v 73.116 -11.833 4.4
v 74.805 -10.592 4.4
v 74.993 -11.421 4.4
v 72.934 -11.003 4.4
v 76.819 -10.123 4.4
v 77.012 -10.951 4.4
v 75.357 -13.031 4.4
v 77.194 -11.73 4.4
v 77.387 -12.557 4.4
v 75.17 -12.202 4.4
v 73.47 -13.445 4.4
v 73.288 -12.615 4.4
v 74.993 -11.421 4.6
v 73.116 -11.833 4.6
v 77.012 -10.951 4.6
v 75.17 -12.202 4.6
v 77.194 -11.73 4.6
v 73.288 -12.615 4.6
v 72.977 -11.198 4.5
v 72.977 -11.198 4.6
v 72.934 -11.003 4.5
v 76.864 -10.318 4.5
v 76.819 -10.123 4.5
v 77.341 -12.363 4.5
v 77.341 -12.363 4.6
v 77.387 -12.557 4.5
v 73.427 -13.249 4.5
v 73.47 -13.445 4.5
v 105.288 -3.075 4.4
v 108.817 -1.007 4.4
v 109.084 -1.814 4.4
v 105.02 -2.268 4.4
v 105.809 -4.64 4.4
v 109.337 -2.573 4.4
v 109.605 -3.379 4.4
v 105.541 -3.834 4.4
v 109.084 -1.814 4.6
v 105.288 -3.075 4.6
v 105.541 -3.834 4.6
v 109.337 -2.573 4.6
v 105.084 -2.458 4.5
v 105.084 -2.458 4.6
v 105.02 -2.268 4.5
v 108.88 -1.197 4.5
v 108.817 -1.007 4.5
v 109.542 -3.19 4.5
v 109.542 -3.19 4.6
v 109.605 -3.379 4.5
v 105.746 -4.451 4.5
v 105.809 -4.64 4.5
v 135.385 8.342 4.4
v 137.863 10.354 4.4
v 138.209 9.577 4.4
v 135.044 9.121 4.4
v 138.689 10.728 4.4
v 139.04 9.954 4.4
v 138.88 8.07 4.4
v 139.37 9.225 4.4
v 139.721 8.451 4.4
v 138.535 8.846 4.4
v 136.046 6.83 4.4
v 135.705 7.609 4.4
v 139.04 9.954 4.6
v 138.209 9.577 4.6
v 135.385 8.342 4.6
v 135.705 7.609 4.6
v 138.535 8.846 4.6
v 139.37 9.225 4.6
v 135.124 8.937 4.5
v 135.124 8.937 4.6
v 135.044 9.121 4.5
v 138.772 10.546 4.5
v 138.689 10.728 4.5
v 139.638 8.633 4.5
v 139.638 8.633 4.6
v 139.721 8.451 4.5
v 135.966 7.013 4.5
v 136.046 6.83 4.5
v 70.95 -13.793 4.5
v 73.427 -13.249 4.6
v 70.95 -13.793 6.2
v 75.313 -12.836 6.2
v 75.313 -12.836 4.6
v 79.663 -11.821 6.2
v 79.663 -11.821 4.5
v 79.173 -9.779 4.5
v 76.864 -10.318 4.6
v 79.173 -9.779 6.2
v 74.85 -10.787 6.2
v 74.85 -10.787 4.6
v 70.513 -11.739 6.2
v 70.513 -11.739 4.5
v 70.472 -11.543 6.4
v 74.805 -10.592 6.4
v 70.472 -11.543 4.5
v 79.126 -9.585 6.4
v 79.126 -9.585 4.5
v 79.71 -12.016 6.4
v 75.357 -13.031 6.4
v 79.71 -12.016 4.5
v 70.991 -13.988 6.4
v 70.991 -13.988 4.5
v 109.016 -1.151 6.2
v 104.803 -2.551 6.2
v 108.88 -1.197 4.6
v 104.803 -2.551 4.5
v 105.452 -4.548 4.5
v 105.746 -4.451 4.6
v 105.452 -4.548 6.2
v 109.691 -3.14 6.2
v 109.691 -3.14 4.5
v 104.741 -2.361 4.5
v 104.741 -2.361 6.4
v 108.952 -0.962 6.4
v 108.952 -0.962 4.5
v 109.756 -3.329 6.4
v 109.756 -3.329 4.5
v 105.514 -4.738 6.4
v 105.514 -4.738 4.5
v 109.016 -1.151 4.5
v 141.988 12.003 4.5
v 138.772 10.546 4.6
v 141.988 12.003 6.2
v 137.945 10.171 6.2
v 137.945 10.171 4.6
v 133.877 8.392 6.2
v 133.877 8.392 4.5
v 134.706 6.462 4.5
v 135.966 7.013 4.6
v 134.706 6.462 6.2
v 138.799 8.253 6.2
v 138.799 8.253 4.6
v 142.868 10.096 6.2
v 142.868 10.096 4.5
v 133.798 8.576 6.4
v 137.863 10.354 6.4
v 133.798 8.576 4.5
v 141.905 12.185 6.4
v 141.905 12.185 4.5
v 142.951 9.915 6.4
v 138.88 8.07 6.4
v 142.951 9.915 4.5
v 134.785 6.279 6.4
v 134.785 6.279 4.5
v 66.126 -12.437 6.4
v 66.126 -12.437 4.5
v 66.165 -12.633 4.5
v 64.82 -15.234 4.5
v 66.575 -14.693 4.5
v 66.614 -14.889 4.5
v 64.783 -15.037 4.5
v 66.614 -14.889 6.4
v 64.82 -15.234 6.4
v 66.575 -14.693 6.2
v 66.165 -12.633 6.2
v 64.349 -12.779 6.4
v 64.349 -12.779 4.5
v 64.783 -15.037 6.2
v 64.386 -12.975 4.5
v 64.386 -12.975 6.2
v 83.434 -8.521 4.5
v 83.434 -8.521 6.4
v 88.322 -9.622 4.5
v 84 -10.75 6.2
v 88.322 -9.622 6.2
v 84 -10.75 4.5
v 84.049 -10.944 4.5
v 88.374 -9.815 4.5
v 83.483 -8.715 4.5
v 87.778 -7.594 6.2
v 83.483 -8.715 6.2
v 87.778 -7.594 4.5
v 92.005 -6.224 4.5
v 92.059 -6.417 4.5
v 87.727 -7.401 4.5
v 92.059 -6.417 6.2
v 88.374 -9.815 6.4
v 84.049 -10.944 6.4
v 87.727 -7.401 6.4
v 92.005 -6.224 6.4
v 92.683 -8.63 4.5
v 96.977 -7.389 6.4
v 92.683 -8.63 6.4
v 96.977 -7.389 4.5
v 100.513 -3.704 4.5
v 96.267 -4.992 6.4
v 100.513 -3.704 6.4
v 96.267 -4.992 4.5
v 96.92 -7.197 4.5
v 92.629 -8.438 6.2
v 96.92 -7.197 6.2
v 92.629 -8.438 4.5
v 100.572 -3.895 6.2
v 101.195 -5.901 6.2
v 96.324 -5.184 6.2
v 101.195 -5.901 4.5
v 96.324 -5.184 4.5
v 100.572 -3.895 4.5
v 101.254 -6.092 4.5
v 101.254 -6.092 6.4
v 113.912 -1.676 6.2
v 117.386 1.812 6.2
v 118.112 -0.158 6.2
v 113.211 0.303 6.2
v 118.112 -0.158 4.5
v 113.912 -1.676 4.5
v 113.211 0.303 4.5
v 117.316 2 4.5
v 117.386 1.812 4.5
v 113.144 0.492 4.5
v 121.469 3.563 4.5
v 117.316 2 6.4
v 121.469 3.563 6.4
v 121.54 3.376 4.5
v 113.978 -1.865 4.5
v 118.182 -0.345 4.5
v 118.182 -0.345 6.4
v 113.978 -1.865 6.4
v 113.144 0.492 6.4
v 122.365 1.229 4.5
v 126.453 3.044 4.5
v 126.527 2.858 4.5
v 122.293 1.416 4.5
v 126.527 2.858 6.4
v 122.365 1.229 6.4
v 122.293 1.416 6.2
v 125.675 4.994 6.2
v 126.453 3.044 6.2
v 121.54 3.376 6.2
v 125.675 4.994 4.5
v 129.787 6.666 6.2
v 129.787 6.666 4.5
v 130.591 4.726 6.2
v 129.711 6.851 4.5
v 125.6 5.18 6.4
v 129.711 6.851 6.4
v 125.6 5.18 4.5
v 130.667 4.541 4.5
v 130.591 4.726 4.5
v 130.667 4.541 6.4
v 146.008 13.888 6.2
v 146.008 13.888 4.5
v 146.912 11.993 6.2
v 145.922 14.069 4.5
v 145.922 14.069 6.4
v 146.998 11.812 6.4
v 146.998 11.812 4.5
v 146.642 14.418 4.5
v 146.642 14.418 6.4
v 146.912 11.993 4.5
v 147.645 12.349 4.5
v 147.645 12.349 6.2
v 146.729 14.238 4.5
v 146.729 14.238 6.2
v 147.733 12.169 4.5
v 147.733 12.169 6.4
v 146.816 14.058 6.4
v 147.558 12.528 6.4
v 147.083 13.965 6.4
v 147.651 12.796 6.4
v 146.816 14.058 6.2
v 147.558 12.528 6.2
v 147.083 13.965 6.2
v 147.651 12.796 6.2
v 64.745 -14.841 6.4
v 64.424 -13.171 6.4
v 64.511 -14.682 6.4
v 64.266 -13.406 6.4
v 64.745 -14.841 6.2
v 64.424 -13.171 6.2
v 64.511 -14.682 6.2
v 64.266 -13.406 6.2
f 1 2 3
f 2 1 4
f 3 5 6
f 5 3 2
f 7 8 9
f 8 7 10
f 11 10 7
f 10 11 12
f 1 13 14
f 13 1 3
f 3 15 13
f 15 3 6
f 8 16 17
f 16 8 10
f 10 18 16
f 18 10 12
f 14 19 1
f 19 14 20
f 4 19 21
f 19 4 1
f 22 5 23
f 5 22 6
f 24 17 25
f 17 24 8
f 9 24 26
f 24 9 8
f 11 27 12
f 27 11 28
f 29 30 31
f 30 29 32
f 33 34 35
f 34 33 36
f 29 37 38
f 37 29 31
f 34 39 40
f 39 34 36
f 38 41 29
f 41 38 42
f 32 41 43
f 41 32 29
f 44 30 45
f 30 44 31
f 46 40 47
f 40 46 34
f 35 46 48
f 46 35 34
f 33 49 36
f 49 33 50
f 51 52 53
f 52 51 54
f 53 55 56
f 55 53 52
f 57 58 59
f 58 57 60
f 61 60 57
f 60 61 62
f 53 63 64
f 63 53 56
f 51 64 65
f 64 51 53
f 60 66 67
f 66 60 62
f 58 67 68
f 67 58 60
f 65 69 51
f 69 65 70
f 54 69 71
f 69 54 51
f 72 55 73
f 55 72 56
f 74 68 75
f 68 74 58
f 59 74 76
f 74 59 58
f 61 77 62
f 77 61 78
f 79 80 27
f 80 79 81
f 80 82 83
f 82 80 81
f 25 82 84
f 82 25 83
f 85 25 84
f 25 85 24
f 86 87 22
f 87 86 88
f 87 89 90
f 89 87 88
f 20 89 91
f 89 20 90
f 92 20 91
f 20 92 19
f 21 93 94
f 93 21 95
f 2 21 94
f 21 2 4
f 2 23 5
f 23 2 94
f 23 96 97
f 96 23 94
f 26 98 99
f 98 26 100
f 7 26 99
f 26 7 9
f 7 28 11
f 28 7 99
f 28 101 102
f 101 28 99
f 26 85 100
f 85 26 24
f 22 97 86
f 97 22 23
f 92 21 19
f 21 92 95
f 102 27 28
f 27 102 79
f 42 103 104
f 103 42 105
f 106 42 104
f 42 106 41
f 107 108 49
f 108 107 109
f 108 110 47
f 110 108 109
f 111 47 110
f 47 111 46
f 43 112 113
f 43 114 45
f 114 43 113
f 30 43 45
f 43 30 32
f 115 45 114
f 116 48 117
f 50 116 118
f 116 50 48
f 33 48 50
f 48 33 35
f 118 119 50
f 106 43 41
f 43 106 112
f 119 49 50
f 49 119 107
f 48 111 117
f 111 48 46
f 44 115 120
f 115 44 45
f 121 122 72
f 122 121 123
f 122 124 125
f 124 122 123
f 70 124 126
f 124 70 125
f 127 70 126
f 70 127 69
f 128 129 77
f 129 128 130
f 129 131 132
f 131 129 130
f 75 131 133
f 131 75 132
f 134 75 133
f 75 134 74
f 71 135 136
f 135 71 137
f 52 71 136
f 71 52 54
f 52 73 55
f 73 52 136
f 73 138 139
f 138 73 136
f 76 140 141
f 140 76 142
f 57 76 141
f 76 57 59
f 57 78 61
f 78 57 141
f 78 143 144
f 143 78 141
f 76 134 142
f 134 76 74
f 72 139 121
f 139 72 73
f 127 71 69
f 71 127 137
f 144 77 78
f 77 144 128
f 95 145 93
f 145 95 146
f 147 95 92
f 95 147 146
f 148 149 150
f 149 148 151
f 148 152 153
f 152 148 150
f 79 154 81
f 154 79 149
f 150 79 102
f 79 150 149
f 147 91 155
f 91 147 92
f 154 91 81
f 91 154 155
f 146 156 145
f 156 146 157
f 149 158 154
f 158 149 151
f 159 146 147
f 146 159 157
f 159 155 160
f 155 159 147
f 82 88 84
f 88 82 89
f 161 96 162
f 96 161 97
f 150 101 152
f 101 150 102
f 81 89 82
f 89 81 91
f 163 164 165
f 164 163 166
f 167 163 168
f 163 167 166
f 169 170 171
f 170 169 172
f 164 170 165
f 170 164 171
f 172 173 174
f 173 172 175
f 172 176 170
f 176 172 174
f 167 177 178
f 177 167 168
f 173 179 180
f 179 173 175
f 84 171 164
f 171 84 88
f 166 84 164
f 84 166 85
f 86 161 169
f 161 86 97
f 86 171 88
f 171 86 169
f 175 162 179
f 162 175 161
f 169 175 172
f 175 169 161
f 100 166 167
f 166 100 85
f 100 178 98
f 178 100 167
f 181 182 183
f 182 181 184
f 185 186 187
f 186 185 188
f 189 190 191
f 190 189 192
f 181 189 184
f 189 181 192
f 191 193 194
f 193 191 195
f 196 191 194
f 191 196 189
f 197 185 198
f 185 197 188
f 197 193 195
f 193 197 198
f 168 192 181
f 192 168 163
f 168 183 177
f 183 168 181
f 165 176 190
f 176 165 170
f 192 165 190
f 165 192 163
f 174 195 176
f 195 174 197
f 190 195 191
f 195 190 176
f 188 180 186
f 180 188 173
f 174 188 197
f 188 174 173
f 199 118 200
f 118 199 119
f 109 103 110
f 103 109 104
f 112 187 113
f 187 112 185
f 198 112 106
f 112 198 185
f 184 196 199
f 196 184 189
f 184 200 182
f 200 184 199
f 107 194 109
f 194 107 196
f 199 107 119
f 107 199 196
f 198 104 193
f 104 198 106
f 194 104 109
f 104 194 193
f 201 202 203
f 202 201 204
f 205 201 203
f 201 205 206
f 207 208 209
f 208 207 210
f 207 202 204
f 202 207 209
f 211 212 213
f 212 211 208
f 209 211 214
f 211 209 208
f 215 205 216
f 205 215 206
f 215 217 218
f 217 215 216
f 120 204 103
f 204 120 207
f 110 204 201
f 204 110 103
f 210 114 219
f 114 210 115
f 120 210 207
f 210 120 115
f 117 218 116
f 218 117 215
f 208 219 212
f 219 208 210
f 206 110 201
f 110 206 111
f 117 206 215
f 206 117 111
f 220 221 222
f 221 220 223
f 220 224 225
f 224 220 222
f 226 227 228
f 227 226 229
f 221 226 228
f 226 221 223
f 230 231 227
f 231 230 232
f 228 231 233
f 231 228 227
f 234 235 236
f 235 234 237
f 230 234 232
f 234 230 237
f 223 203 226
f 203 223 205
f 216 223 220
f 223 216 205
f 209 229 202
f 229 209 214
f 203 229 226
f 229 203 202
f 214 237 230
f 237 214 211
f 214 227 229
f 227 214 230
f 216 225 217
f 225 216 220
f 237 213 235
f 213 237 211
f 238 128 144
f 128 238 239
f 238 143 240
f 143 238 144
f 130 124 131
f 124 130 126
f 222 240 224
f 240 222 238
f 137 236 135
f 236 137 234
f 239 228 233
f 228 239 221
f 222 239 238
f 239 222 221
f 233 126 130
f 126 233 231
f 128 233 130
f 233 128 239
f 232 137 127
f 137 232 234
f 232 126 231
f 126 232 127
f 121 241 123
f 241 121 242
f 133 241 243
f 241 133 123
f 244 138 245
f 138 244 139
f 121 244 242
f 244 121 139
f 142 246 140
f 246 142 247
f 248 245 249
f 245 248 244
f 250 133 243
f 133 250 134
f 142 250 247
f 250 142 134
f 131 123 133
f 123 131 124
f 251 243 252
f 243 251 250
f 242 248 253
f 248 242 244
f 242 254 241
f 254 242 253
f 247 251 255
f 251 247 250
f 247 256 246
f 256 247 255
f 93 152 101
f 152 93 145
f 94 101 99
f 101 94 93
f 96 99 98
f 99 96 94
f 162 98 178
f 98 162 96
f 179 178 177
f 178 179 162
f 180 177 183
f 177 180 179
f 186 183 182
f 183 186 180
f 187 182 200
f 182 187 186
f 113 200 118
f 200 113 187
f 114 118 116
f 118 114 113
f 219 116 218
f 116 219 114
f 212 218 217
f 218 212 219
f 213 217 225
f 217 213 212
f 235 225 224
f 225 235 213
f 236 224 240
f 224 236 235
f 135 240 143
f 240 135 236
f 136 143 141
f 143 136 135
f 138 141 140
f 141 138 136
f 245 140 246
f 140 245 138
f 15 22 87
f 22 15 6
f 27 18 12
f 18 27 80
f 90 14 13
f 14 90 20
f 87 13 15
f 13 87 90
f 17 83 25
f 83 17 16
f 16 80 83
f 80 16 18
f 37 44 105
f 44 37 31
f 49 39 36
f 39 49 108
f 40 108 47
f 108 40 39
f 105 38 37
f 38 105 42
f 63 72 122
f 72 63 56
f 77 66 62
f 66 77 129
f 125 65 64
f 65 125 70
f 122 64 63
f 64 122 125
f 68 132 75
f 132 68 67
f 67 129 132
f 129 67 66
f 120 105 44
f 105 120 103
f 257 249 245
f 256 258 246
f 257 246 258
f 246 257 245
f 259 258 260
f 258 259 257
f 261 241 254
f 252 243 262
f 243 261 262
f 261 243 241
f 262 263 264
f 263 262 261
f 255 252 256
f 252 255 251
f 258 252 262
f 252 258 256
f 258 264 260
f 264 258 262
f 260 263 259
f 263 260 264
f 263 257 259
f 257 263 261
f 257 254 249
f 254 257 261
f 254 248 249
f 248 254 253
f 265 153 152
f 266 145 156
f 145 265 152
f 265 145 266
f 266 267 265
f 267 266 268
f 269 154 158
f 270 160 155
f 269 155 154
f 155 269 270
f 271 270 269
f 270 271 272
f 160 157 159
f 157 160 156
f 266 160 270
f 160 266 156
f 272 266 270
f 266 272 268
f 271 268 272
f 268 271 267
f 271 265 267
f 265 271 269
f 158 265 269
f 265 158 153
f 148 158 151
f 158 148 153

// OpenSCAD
use <../lib.scad>
use <u9098.scad>
function ldraw_lib__u9541() = [
// 0 ~Train Track  9V Switch Left - Curved Metal Rail, Closure Rail
// 0 Name: u9541.dat
// 0 Author: Max Martin Richter [MMR1988]
// 0 !LDRAW_ORG Part UPDATE 2025-08
// 0 !LICENSE Licensed under CC BY 4.0 : see CAreadme.txt
// 
// 0 BFC CERTIFY CCW
  [0,"BFC","CERTIFY"],
  [0,"BFC","CCW"],
// 
// 0 !HISTORY 2025-08-31 [OrionP] Official Update 2025-08
// 
// 1 16 0 0 0 1 0 0 0 1 0 0 0 -1 u9098.dat
  [1,16,0,0,0,1,0,0,0,1,0,0,0,-1, ldraw_lib__u9098()],
];
module ldraw_lib__u9541(step=0, col=false, unit=2/5, alt=false, line=0.2, solid=!$preview)
    makepoly(ldraw_lib__u9541(), step=step, col=col, unit=unit, alt=alt, line=line, solid=solid);
ldraw_lib__u9541(line=0.2);
